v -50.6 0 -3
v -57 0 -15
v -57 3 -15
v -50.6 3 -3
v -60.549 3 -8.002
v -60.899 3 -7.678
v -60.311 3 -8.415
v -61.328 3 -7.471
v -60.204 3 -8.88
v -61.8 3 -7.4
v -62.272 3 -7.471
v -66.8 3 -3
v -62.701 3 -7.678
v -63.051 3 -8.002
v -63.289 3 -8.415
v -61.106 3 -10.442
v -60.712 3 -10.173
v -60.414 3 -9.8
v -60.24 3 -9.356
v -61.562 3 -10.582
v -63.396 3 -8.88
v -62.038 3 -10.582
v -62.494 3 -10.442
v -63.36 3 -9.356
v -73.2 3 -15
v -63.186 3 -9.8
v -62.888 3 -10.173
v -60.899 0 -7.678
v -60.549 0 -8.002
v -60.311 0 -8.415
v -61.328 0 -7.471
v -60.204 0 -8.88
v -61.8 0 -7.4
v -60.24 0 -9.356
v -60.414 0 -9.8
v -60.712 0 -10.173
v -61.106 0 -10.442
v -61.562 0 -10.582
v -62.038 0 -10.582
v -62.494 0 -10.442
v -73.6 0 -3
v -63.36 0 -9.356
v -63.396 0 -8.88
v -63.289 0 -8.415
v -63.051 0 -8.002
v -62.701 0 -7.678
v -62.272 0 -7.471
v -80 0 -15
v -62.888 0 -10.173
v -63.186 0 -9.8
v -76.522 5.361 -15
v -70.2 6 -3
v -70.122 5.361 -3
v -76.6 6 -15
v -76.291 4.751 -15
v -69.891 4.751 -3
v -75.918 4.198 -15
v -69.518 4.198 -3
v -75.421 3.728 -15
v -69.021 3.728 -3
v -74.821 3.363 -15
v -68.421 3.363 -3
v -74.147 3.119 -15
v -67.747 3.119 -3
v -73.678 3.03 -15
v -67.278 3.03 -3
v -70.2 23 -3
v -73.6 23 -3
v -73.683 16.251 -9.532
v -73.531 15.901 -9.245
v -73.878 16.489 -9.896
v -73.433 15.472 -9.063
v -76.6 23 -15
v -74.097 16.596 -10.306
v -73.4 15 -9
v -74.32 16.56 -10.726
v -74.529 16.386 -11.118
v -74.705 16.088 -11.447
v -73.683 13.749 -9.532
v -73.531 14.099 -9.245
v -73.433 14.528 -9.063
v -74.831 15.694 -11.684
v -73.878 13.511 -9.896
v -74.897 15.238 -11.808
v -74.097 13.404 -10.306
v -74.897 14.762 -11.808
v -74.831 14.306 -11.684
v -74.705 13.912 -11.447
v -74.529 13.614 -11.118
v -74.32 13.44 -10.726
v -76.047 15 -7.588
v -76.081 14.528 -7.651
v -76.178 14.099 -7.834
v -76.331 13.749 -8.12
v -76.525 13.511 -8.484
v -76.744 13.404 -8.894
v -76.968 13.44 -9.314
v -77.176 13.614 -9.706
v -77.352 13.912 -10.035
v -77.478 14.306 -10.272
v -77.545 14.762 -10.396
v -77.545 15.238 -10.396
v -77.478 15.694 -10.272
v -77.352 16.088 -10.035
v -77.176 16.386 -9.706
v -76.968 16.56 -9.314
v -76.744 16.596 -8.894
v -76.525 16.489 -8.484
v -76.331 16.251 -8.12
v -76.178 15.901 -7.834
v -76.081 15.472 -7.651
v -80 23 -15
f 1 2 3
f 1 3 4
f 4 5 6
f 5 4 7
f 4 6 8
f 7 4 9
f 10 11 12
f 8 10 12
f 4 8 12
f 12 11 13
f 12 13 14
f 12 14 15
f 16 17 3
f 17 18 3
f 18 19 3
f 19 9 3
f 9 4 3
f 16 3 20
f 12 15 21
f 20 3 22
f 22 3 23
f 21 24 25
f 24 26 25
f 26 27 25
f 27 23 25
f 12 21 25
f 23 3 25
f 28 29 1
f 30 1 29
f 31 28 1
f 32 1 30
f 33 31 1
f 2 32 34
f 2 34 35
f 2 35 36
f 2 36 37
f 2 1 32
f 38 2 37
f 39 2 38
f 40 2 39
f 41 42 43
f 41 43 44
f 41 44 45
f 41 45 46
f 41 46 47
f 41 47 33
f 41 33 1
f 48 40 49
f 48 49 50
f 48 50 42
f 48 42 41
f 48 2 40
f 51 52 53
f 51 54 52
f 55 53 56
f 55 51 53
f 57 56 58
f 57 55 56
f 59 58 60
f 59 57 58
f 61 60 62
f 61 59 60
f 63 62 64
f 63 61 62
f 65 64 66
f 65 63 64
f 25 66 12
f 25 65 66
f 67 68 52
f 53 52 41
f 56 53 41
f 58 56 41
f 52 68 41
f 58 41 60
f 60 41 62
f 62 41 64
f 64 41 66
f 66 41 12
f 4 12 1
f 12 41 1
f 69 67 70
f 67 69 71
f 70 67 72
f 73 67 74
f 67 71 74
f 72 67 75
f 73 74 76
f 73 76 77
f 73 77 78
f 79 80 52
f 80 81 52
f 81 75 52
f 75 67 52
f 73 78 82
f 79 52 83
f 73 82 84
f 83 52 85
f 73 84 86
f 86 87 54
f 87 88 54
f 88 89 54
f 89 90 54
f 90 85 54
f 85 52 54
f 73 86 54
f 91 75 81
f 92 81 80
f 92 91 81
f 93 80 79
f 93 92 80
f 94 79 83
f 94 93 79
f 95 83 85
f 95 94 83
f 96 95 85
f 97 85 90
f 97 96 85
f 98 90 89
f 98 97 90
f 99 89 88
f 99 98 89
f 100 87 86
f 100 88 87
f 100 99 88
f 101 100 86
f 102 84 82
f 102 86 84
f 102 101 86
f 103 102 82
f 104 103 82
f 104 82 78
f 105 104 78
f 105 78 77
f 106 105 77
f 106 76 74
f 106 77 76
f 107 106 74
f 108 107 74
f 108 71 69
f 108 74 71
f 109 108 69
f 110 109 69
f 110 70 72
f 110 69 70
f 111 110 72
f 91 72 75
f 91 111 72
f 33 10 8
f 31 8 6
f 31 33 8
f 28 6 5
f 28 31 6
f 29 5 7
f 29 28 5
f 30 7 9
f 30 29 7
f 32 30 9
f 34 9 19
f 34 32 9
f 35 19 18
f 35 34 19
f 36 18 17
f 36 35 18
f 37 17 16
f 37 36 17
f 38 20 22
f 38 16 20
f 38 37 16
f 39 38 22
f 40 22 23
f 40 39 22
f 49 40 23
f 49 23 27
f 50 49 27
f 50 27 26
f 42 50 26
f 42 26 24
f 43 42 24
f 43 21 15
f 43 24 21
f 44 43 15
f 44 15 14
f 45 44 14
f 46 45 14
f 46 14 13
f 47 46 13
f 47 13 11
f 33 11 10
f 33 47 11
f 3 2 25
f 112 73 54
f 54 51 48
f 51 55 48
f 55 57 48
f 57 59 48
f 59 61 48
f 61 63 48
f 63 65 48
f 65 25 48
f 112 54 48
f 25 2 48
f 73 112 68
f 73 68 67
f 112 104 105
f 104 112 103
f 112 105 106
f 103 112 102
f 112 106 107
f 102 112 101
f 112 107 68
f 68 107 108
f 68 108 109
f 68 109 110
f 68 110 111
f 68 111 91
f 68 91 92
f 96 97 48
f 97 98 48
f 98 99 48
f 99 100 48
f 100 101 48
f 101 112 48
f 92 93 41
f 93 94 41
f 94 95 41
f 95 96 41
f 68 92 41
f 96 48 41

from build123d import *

# Parameters (mm, degrees)
EXTRUDE_1_DEPTH     = 3
EXTRUDE_2_DEPTH     = 20
CUT_EXTRUDE_1_REACH = 86.581
SKETCH_3_R          = 1.6
CUT_EXTRUDE_2_REACH = 57.839
SKETCH_4_R          = 1.6
FILLET_1_R          = 3


with BuildPart() as part:
    # 草图1 → 凸台-拉伸1 (new body)
    with BuildSketch(Plane(origin=(0, 0, 0), x_dir=(1, 0, 0), z_dir=(0, 1, 0))):
        Polygon((-80, 15), (-57, 15), (-50.6, 3), (-73.6, 3), align=None)
    extrude(amount=EXTRUDE_1_DEPTH)

    # 草图2 → 凸台-拉伸2 (add)
    with BuildSketch(Plane(origin=(0, 3, 0), x_dir=(1, 0, 0), z_dir=(0, 1, 0))):
        Polygon((-80, 15), (-73.6, 3), (-70.2, 3), (-76.6, 15), align=None)
    extrude(amount=EXTRUDE_2_DEPTH)

    # 草图3 → 切除-拉伸1 (cut, up to next)
    with BuildSketch(Plane(origin=(0, 0, 0), x_dir=(1, 0, 0), z_dir=(0, 1, 0)), mode=Mode.PRIVATE) as cut_extrude_1_sk1:
        with Locations(Location((-61.8, 9, 0), (0, 0, 270))):
            Circle(SKETCH_3_R)
    cut_extrude_1_tool1 = extrude(cut_extrude_1_sk1.sketch, amount=CUT_EXTRUDE_1_REACH, mode=Mode.PRIVATE) & part.part
    add(cut_extrude_1_tool1.solids().sort_by_distance((-61.8, 0, -9))[0], mode=Mode.SUBTRACT)

    # 草图4 → 切除-拉伸2 (cut, up to next)
    with BuildSketch(Plane(origin=(-56.055363322, 0, 29.896193772), x_dir=(-0.4705882352941182, 0, -0.8823529411764703), z_dir=(0.8823529411764703, 0, -0.4705882352941182)), mode=Mode.PRIVATE) as cut_extrude_2_sk1:
        with Locations(Location((44.082352941, 15, 0), (0, 0, 180))):
            Circle(SKETCH_4_R)
    cut_extrude_2_tool1 = extrude(cut_extrude_2_sk1.sketch, amount=CUT_EXTRUDE_2_REACH, mode=Mode.PRIVATE) & part.part
    add(cut_extrude_2_tool1.solids().sort_by_distance((-76.8, 15, -9))[0], mode=Mode.SUBTRACT)

    # 圆角1
    fillet_1_edges = [part.edges().sort_by_distance(p)[0] for p in [
        (-73.4, 3, -9),
    ]]
    fillet(fillet_1_edges, radius=FILLET_1_R)


solid = part.part
